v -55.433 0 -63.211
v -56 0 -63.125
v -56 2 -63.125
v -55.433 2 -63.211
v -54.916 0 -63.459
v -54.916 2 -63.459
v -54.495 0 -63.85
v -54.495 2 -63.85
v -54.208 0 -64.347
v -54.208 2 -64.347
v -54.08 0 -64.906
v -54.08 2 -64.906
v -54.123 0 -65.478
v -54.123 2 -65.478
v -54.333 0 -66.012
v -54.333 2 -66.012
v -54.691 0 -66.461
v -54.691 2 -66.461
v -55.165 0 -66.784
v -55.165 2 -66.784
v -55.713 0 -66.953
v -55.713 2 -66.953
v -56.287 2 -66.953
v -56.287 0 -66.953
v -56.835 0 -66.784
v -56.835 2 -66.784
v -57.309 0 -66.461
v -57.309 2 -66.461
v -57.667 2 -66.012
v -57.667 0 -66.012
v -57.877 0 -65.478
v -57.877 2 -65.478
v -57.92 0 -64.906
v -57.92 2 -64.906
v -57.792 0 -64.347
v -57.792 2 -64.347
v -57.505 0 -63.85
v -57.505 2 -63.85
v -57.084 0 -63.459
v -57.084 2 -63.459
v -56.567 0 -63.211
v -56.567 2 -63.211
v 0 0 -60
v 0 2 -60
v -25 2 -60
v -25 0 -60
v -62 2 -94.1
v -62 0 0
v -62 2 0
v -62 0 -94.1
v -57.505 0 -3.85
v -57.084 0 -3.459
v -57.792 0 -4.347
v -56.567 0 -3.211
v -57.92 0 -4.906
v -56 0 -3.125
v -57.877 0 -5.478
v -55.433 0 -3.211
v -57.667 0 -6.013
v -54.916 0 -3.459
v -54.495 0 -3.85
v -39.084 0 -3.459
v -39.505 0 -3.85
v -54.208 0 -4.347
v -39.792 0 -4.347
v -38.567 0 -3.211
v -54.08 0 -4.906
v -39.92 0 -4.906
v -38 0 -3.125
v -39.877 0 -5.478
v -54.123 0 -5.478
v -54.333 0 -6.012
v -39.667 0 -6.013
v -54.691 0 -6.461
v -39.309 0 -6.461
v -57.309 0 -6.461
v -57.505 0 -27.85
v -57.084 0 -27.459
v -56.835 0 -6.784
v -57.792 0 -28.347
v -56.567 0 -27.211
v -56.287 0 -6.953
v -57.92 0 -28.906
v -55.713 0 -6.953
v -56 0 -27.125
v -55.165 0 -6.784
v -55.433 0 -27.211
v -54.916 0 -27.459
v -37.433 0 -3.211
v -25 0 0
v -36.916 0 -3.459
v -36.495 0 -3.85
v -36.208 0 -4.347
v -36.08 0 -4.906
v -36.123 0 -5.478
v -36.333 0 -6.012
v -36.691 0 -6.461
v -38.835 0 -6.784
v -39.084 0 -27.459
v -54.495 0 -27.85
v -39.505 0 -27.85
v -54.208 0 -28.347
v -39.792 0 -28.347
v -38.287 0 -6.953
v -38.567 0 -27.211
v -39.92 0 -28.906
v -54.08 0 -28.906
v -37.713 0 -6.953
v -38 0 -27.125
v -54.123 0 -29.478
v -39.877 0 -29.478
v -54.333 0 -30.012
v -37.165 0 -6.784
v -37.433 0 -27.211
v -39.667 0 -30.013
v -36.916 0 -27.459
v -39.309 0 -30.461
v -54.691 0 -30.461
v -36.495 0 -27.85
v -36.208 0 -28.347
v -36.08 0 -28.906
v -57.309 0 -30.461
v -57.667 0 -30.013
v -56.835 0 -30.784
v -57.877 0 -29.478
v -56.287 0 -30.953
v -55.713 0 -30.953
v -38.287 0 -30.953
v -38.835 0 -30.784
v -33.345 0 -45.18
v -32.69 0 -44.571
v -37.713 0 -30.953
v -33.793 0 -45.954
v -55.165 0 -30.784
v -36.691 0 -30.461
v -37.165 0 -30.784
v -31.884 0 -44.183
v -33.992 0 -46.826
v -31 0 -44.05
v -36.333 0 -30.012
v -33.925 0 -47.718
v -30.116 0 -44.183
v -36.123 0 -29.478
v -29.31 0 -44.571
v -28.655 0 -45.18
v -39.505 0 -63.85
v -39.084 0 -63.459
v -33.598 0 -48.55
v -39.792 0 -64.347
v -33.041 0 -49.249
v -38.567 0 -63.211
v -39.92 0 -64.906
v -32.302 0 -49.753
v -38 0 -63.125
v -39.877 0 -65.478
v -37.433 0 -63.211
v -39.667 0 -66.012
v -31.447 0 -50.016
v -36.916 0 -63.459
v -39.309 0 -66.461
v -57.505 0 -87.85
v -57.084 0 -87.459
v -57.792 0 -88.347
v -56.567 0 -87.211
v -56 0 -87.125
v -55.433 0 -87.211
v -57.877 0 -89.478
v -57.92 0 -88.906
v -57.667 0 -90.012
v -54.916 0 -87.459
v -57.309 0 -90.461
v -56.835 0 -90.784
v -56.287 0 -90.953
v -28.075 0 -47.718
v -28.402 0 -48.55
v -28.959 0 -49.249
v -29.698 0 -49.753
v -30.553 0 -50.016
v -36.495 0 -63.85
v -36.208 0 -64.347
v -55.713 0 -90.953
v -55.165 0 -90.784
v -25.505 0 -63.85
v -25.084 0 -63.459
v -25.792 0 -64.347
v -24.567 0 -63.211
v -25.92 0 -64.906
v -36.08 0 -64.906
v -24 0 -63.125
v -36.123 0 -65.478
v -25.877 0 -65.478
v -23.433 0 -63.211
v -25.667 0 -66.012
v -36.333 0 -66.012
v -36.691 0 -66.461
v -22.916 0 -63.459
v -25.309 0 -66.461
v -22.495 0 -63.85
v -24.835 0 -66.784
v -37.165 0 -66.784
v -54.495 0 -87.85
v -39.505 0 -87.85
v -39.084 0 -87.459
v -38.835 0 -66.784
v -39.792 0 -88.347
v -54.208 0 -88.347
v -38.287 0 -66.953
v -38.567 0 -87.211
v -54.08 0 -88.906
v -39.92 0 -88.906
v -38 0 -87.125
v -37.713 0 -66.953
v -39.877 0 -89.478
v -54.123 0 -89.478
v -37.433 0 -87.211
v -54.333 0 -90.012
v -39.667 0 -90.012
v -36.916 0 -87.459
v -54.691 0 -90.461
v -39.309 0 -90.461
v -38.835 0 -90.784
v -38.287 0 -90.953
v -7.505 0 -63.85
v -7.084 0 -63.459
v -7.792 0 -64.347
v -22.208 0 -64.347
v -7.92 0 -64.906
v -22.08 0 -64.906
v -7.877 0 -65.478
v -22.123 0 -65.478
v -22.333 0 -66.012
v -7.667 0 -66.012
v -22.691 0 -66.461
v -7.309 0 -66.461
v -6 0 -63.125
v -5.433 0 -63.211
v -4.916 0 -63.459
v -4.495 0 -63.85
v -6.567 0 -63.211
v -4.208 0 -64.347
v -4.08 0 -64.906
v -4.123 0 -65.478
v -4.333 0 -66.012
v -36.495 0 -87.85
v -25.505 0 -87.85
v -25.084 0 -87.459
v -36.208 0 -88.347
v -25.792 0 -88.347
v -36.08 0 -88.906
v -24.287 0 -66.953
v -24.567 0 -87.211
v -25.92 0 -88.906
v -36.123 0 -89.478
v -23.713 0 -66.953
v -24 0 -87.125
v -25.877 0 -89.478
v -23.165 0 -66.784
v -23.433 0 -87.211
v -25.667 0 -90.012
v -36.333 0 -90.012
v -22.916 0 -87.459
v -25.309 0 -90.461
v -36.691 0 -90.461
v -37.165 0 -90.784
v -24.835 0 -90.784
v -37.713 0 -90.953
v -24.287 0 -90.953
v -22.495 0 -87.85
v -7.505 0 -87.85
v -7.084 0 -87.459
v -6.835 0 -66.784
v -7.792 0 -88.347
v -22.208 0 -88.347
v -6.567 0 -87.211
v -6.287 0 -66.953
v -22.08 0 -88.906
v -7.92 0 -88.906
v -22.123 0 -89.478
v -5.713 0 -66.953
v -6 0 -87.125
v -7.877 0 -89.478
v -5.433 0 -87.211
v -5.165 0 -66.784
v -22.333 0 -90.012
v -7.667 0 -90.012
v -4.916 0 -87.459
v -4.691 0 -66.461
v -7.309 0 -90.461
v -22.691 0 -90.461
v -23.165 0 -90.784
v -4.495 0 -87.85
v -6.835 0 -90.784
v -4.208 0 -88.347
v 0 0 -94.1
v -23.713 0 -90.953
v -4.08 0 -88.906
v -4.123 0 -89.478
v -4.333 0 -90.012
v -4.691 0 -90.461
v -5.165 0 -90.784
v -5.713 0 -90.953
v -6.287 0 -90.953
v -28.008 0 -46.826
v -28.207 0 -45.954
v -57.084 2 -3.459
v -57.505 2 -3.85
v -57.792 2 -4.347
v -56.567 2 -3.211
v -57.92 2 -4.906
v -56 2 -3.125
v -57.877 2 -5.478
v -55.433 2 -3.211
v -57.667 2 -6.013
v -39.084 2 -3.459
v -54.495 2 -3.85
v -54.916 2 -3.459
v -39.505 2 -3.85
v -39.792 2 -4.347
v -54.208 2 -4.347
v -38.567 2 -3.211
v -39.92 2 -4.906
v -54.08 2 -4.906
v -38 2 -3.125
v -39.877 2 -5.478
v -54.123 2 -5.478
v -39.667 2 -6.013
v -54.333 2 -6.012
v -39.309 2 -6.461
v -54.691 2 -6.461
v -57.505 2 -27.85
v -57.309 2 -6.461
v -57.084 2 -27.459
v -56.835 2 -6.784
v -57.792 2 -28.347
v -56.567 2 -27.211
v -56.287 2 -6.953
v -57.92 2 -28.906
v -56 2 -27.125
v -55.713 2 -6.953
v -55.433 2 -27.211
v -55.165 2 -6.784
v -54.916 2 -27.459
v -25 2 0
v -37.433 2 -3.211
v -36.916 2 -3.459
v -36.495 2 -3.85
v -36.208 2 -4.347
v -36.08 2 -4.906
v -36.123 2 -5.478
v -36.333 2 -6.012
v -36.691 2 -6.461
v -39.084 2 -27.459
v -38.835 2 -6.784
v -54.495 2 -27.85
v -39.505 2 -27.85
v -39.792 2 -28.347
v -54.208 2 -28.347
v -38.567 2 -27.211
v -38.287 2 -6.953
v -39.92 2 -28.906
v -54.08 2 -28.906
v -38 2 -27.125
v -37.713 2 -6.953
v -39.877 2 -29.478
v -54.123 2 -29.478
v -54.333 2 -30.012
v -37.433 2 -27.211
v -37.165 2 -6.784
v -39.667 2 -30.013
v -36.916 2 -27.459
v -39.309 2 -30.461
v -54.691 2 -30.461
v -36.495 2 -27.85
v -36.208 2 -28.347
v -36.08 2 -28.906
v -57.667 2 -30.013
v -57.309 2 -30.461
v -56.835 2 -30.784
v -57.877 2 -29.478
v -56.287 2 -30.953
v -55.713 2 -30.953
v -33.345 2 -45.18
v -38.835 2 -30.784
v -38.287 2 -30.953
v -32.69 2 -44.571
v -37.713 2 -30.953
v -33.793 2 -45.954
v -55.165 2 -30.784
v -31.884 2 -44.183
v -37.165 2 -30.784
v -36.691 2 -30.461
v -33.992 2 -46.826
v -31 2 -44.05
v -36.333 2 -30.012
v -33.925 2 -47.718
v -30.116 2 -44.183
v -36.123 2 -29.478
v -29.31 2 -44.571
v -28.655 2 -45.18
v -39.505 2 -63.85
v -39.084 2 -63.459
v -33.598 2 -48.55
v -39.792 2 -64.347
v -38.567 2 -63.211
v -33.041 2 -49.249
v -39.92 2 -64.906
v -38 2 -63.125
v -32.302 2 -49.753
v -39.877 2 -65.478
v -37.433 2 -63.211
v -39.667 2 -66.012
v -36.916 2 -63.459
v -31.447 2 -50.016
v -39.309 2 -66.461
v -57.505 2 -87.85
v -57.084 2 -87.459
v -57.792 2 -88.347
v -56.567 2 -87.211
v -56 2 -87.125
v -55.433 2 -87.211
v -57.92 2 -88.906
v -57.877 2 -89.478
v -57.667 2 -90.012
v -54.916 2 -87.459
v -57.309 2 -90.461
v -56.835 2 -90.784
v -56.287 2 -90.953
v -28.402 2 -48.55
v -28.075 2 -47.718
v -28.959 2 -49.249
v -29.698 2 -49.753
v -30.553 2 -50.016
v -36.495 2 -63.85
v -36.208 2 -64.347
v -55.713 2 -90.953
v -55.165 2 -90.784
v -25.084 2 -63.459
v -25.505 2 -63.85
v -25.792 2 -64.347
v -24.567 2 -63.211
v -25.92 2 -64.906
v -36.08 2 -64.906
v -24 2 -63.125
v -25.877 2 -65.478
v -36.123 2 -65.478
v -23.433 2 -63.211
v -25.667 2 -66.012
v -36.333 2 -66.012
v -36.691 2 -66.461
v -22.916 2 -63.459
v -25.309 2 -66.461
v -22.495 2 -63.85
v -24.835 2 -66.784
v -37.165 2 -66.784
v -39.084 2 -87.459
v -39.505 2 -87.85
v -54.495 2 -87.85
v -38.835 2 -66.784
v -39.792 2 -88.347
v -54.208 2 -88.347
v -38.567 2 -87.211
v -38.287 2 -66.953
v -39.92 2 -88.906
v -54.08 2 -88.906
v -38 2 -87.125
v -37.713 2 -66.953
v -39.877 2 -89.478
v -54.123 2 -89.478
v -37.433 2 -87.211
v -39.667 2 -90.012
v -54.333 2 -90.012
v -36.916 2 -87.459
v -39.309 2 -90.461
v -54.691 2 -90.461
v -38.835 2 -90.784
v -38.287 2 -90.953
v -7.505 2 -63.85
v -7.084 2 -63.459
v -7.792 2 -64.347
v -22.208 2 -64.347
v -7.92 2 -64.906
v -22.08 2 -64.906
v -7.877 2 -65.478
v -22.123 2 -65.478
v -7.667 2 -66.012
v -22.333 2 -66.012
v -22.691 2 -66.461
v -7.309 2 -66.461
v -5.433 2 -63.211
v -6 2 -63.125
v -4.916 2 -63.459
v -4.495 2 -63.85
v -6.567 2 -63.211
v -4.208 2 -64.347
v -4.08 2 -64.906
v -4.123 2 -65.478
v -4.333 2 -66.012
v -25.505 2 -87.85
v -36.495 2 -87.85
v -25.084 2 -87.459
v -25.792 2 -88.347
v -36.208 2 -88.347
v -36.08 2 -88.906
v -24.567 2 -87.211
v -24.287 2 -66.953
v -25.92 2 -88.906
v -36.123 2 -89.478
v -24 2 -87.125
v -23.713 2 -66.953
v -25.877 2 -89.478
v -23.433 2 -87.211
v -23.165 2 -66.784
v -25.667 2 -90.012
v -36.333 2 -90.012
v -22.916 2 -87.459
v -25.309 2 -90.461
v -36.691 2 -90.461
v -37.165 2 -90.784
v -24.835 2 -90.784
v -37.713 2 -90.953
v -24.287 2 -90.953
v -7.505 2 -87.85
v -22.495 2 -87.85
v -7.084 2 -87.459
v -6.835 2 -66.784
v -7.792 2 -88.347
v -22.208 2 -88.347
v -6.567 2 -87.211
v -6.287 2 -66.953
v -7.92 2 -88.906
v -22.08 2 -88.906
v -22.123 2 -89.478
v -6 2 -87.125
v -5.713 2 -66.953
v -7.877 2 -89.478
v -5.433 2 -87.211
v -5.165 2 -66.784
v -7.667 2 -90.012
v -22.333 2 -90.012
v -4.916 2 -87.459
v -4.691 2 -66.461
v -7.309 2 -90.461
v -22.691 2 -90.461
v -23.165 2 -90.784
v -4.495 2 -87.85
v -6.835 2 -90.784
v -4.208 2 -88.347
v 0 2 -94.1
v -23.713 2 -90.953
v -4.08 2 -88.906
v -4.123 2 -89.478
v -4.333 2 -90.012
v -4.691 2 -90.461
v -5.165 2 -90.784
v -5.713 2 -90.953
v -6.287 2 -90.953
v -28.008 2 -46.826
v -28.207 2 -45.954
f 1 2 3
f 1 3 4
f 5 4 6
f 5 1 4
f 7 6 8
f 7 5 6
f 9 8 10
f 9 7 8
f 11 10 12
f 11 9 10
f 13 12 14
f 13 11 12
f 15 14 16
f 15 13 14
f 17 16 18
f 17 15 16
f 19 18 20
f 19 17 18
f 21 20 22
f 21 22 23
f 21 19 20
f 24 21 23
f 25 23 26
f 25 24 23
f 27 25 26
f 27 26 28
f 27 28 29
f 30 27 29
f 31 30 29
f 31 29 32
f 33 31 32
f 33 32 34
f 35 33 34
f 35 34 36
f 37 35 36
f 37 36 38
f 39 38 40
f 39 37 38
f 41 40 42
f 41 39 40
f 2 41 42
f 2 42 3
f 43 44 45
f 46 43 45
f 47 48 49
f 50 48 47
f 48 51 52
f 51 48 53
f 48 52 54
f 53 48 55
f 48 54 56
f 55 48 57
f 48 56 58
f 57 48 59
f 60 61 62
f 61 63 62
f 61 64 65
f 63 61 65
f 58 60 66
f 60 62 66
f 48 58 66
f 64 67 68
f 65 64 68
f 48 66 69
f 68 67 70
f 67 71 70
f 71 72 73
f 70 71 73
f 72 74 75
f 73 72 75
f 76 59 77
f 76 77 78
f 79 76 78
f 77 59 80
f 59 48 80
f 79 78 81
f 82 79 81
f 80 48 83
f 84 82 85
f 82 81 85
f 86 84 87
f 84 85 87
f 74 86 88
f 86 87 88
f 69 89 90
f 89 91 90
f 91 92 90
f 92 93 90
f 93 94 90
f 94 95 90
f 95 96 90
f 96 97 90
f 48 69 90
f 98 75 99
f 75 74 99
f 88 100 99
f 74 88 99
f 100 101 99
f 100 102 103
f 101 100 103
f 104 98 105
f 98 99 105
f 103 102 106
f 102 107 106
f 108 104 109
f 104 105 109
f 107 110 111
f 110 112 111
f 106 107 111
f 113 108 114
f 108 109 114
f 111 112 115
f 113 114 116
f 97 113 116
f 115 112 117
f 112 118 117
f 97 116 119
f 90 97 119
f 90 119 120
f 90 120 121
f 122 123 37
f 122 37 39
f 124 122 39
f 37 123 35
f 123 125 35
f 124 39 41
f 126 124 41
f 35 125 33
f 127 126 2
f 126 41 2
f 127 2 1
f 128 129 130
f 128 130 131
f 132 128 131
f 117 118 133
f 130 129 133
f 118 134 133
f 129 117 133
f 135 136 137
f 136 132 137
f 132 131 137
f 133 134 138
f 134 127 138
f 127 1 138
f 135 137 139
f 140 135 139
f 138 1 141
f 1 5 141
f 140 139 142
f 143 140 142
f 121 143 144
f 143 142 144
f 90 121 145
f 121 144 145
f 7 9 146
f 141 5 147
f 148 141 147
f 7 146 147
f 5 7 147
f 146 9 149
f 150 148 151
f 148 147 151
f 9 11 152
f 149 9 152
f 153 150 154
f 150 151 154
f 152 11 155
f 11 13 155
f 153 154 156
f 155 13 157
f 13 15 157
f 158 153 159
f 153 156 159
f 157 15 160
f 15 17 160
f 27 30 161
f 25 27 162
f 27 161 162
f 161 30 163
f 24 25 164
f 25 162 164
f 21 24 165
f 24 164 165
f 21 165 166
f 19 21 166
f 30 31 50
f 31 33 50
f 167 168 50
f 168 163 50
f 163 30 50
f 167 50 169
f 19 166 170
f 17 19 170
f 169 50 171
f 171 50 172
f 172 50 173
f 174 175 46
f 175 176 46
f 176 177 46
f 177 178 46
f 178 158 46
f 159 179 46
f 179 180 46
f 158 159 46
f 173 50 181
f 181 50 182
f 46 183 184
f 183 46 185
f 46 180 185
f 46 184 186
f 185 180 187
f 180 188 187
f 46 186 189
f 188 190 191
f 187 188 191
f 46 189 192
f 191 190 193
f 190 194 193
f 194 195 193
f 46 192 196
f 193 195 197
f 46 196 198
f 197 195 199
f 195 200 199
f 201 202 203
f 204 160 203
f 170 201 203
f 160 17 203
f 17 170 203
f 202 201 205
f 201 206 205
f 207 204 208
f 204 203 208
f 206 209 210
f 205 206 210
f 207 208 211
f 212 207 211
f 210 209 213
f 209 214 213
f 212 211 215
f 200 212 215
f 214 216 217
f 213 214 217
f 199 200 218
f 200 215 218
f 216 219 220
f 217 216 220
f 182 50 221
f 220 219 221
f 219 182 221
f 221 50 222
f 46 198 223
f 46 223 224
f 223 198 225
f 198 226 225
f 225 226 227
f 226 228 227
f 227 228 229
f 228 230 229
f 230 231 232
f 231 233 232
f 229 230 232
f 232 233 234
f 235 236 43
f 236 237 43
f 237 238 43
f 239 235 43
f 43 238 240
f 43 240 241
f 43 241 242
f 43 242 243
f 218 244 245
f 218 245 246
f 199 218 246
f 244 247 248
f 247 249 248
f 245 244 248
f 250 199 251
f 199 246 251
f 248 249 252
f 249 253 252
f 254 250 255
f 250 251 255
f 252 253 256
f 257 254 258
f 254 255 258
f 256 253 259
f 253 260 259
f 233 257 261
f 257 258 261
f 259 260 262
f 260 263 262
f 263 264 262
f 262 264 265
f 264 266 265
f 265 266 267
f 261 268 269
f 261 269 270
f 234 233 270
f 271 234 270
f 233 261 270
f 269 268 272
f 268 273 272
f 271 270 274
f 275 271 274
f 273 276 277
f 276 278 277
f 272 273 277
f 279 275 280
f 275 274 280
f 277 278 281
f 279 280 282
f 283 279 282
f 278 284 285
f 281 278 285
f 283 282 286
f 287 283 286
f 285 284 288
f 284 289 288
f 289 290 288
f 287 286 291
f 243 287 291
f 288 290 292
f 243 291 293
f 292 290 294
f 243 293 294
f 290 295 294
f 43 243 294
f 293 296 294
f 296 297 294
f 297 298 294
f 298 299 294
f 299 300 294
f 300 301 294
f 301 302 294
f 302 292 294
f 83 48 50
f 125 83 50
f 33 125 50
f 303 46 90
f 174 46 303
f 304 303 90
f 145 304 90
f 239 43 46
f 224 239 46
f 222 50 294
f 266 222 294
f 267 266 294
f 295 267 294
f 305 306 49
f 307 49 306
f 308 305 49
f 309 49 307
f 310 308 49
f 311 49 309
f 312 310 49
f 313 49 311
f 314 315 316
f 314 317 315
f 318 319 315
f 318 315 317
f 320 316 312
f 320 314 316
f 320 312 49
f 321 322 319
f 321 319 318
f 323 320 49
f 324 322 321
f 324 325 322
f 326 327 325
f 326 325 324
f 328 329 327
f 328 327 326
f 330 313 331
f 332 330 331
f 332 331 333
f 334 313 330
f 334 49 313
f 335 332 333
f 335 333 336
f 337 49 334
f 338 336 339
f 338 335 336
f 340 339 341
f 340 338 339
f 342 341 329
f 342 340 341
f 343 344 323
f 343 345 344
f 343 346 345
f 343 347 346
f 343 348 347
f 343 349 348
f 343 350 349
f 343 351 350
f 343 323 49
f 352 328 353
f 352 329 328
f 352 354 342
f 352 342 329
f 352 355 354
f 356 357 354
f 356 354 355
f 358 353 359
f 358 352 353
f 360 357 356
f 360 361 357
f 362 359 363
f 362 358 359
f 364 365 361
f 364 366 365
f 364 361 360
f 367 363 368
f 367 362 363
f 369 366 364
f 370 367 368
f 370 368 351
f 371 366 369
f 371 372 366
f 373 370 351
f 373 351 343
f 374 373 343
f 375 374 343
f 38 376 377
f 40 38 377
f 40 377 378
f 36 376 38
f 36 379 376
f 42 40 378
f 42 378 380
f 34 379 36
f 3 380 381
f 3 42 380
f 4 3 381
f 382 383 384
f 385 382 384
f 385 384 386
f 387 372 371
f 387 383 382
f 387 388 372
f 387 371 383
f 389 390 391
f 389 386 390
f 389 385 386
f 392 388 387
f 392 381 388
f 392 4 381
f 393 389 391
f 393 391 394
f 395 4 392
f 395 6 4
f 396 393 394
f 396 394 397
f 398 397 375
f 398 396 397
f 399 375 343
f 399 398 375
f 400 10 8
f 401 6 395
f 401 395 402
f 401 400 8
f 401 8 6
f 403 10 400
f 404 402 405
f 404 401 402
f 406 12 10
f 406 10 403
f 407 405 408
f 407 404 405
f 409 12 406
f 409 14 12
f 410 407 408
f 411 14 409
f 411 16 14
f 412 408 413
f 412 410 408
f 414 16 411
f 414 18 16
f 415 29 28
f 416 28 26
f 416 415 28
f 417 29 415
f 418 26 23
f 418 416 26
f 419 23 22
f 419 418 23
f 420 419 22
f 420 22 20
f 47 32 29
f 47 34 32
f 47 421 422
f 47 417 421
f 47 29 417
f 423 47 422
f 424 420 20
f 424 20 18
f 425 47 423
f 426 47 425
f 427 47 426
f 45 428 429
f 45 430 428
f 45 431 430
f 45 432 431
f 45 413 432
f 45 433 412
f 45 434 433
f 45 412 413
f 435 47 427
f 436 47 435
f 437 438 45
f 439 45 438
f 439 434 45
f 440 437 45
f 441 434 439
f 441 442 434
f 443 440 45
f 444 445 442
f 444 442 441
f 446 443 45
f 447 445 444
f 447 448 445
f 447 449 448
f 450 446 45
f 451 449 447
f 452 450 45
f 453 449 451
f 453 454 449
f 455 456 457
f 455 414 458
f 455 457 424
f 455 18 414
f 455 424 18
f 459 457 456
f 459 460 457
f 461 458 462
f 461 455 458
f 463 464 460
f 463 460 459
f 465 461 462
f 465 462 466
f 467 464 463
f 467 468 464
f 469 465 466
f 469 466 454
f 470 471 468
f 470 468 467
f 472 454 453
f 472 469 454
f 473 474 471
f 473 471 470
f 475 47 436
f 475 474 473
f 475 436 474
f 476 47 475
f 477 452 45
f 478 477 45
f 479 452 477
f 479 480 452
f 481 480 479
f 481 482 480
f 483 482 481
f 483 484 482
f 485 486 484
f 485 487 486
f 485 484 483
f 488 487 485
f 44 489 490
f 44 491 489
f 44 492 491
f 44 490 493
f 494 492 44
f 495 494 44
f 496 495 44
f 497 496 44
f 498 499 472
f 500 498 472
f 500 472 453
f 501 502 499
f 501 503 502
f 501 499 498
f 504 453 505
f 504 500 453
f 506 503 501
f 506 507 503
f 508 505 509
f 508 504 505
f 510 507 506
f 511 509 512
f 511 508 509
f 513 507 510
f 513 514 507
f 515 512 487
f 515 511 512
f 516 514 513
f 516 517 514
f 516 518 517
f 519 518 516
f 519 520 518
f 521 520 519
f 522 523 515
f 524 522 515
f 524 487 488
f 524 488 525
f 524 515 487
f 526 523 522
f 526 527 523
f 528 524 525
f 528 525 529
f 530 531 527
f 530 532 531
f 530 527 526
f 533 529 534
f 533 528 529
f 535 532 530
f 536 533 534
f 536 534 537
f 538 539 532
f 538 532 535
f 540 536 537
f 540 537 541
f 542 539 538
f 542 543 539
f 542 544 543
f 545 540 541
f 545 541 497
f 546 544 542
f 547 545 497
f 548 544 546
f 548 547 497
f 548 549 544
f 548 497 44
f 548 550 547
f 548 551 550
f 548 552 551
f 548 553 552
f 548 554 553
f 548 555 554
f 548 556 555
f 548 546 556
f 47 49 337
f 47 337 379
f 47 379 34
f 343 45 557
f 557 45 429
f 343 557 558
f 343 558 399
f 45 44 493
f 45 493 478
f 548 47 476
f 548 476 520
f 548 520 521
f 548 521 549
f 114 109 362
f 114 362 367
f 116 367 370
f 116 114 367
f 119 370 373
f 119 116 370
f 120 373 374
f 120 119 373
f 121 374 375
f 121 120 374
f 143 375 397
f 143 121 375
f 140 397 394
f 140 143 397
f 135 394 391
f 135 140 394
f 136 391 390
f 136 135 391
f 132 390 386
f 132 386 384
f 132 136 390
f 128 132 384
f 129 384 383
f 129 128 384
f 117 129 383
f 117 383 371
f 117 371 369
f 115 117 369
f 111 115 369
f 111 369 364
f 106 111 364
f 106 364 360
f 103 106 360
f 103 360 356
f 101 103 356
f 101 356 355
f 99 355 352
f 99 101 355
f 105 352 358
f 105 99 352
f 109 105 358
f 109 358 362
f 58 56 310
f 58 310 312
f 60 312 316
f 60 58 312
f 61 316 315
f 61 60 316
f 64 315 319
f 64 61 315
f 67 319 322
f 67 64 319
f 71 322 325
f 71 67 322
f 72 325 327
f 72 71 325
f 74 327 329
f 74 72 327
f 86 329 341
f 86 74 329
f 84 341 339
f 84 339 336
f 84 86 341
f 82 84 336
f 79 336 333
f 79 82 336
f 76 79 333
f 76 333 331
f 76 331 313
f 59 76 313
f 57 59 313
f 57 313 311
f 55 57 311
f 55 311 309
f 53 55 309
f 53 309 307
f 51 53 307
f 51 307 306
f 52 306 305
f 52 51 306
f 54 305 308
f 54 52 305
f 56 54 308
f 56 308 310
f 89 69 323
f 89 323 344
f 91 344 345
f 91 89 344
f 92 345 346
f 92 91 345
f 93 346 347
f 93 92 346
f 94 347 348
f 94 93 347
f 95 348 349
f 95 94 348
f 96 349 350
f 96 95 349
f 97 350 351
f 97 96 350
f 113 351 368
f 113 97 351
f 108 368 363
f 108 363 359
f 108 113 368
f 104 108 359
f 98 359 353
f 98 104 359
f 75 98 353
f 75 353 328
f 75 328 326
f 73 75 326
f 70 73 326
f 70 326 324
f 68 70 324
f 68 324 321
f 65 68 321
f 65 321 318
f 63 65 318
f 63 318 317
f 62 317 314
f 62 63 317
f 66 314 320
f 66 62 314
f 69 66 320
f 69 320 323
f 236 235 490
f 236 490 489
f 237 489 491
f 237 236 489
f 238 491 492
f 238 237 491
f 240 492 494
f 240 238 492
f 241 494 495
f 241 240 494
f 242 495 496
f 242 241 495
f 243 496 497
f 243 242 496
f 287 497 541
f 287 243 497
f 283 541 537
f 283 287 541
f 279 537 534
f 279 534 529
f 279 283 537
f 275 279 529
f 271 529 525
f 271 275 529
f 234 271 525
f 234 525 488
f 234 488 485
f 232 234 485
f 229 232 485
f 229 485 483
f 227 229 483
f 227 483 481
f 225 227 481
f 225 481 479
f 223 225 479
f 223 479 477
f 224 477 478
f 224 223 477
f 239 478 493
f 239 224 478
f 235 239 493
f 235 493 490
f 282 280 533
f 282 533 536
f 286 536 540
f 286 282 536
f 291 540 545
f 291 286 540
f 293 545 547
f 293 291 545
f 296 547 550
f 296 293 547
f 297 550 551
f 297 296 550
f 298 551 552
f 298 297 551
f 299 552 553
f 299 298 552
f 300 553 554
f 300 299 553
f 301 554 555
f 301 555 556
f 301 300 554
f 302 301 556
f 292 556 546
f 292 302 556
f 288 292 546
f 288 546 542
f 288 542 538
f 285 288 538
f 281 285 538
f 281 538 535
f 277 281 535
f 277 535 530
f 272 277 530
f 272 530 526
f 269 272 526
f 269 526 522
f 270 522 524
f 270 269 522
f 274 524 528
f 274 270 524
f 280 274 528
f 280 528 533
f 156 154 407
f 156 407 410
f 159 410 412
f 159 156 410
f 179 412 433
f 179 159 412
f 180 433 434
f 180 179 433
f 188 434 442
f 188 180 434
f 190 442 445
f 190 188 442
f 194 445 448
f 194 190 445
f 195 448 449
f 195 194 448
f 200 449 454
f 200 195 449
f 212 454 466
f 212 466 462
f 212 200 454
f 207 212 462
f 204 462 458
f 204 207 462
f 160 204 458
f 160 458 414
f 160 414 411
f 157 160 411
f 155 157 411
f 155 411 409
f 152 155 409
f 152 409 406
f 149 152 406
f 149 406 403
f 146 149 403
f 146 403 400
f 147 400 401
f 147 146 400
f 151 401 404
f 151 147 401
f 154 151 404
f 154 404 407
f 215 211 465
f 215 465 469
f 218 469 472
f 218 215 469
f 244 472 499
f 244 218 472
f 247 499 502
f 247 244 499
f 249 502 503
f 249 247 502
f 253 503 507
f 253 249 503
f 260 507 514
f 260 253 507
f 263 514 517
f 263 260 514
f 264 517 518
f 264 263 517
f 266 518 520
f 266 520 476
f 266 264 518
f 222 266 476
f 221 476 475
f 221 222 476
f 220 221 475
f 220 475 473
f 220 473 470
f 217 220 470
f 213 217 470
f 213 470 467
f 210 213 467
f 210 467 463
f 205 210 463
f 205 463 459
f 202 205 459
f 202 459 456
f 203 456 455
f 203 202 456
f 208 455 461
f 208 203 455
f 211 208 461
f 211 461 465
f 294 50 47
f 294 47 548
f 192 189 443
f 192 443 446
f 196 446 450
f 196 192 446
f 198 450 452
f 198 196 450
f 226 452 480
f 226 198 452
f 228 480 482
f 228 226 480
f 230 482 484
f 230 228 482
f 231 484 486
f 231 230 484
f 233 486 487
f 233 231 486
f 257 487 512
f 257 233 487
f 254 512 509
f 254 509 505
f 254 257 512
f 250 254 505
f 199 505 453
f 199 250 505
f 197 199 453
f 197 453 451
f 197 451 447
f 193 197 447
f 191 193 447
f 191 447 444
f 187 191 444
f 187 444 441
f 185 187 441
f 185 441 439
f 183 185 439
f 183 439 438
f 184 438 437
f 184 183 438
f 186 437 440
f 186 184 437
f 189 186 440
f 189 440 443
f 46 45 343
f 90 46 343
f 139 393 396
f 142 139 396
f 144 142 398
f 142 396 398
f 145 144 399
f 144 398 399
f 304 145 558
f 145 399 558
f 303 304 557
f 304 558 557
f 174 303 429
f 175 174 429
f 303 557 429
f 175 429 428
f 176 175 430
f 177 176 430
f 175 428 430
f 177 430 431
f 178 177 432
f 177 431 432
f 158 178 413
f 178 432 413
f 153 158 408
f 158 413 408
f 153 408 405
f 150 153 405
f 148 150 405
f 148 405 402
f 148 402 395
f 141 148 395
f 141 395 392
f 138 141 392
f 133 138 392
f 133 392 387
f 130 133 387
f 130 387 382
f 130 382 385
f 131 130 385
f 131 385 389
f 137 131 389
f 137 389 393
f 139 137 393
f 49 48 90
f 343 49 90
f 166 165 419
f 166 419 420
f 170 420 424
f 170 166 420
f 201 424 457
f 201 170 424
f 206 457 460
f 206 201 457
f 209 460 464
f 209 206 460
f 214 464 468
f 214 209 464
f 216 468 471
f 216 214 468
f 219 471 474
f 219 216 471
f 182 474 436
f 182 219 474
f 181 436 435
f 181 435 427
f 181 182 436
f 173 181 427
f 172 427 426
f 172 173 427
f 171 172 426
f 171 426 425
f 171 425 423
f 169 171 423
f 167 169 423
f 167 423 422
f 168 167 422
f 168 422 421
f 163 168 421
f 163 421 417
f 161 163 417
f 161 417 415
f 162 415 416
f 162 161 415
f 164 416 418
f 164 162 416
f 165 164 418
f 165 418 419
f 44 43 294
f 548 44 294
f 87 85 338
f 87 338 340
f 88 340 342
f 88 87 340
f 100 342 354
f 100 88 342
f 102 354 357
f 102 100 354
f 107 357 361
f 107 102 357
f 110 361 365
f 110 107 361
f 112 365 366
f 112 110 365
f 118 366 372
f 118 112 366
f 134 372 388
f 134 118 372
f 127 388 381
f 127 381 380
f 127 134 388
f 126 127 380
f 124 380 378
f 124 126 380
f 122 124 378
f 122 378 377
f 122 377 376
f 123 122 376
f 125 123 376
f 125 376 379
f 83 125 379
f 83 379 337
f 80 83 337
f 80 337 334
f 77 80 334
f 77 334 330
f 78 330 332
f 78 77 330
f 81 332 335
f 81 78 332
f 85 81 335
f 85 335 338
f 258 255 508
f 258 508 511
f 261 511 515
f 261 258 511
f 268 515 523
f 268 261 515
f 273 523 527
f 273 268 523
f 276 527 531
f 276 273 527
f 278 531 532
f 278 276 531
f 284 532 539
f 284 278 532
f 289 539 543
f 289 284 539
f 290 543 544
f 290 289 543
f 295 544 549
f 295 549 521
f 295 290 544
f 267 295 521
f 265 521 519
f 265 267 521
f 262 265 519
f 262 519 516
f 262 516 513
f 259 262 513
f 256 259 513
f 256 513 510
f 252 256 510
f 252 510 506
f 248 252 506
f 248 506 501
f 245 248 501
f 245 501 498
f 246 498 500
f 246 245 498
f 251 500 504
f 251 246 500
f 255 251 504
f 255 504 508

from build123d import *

# Parameters (mm, degrees)
SKETCH1_W           = 62
SKETCH1_H           = 94.1
SKETCH1_R           = 1.925
BOSS_EXTRUDE1_DEPTH = 2
SKETCH2_R           = 3
CUT_EXTRUDE1_DEPTH  = 113.706743365
CUT_EXTRUDE2_DEPTH  = 113.706743365


with BuildPart() as part:
    # Sketch1 → Boss-Extrude1 (new body)
    with BuildSketch(Plane(origin=(0, 0, 0), x_dir=(1, 0, 0), z_dir=(0, 1, 0))):
        with Locations((-31, 47.05)):
            Rectangle(SKETCH1_W, SKETCH1_H)
        with Locations(Location((-56, 89.05, 0), (0, 0, 270))):
            Circle(SKETCH1_R, mode=Mode.SUBTRACT)
        with Locations(Location((-38, 89.05, 0), (0, 0, 270))):
            Circle(SKETCH1_R, mode=Mode.SUBTRACT)
        with Locations(Location((-38, 65.05, 0), (0, 0, 270))):
            Circle(SKETCH1_R, mode=Mode.SUBTRACT)
        with Locations(Location((-56, 65.05, 0), (0, 0, 270))):
            Circle(SKETCH1_R, mode=Mode.SUBTRACT)
        with Locations(Location((-56, 29.05, 0), (0, 0, 270))):
            Circle(SKETCH1_R, mode=Mode.SUBTRACT)
        with Locations(Location((-38, 29.05, 0), (0, 0, 270))):
            Circle(SKETCH1_R, mode=Mode.SUBTRACT)
        with Locations(Location((-38, 5.05, 0), (0, 0, 270))):
            Circle(SKETCH1_R, mode=Mode.SUBTRACT)
        with Locations(Location((-56, 5.05, 0), (0, 0, 270))):
            Circle(SKETCH1_R, mode=Mode.SUBTRACT)
        with Locations(Location((-24, 89.05, 0), (0, 0, 270))):
            Circle(SKETCH1_R, mode=Mode.SUBTRACT)
        with Locations(Location((-6, 89.05, 0), (0, 0, 270))):
            Circle(SKETCH1_R, mode=Mode.SUBTRACT)
        with Locations(Location((-6, 65.05, 0), (0, 0, 270))):
            Circle(SKETCH1_R, mode=Mode.SUBTRACT)
        with Locations(Location((-24, 65.05, 0), (0, 0, 270))):
            Circle(SKETCH1_R, mode=Mode.SUBTRACT)
    extrude(amount=BOSS_EXTRUDE1_DEPTH)

    # Sketch2 → Cut-Extrude1 (cut, through all)
    with BuildSketch(Plane(origin=(0, 2, 0), x_dir=(1, 0, 0), z_dir=(0, 1, 0))):
        with Locations(Location((-31, 47.05, 0), (0, 0, 270))):
            Circle(SKETCH2_R)
    extrude(amount=-CUT_EXTRUDE1_DEPTH, mode=Mode.SUBTRACT)

    # Sketch4 → Cut-Extrude2 (cut, through all)
    with BuildSketch(Plane(origin=(0, 2, 0), x_dir=(1, 0, 0), z_dir=(0, 1, 0))):
        Polygon((0, 60), (-25, 60), (-25, 0), (0, 0), (0, 33.776627829), align=None)
    extrude(amount=-CUT_EXTRUDE2_DEPTH, mode=Mode.SUBTRACT)


solid = part.part
